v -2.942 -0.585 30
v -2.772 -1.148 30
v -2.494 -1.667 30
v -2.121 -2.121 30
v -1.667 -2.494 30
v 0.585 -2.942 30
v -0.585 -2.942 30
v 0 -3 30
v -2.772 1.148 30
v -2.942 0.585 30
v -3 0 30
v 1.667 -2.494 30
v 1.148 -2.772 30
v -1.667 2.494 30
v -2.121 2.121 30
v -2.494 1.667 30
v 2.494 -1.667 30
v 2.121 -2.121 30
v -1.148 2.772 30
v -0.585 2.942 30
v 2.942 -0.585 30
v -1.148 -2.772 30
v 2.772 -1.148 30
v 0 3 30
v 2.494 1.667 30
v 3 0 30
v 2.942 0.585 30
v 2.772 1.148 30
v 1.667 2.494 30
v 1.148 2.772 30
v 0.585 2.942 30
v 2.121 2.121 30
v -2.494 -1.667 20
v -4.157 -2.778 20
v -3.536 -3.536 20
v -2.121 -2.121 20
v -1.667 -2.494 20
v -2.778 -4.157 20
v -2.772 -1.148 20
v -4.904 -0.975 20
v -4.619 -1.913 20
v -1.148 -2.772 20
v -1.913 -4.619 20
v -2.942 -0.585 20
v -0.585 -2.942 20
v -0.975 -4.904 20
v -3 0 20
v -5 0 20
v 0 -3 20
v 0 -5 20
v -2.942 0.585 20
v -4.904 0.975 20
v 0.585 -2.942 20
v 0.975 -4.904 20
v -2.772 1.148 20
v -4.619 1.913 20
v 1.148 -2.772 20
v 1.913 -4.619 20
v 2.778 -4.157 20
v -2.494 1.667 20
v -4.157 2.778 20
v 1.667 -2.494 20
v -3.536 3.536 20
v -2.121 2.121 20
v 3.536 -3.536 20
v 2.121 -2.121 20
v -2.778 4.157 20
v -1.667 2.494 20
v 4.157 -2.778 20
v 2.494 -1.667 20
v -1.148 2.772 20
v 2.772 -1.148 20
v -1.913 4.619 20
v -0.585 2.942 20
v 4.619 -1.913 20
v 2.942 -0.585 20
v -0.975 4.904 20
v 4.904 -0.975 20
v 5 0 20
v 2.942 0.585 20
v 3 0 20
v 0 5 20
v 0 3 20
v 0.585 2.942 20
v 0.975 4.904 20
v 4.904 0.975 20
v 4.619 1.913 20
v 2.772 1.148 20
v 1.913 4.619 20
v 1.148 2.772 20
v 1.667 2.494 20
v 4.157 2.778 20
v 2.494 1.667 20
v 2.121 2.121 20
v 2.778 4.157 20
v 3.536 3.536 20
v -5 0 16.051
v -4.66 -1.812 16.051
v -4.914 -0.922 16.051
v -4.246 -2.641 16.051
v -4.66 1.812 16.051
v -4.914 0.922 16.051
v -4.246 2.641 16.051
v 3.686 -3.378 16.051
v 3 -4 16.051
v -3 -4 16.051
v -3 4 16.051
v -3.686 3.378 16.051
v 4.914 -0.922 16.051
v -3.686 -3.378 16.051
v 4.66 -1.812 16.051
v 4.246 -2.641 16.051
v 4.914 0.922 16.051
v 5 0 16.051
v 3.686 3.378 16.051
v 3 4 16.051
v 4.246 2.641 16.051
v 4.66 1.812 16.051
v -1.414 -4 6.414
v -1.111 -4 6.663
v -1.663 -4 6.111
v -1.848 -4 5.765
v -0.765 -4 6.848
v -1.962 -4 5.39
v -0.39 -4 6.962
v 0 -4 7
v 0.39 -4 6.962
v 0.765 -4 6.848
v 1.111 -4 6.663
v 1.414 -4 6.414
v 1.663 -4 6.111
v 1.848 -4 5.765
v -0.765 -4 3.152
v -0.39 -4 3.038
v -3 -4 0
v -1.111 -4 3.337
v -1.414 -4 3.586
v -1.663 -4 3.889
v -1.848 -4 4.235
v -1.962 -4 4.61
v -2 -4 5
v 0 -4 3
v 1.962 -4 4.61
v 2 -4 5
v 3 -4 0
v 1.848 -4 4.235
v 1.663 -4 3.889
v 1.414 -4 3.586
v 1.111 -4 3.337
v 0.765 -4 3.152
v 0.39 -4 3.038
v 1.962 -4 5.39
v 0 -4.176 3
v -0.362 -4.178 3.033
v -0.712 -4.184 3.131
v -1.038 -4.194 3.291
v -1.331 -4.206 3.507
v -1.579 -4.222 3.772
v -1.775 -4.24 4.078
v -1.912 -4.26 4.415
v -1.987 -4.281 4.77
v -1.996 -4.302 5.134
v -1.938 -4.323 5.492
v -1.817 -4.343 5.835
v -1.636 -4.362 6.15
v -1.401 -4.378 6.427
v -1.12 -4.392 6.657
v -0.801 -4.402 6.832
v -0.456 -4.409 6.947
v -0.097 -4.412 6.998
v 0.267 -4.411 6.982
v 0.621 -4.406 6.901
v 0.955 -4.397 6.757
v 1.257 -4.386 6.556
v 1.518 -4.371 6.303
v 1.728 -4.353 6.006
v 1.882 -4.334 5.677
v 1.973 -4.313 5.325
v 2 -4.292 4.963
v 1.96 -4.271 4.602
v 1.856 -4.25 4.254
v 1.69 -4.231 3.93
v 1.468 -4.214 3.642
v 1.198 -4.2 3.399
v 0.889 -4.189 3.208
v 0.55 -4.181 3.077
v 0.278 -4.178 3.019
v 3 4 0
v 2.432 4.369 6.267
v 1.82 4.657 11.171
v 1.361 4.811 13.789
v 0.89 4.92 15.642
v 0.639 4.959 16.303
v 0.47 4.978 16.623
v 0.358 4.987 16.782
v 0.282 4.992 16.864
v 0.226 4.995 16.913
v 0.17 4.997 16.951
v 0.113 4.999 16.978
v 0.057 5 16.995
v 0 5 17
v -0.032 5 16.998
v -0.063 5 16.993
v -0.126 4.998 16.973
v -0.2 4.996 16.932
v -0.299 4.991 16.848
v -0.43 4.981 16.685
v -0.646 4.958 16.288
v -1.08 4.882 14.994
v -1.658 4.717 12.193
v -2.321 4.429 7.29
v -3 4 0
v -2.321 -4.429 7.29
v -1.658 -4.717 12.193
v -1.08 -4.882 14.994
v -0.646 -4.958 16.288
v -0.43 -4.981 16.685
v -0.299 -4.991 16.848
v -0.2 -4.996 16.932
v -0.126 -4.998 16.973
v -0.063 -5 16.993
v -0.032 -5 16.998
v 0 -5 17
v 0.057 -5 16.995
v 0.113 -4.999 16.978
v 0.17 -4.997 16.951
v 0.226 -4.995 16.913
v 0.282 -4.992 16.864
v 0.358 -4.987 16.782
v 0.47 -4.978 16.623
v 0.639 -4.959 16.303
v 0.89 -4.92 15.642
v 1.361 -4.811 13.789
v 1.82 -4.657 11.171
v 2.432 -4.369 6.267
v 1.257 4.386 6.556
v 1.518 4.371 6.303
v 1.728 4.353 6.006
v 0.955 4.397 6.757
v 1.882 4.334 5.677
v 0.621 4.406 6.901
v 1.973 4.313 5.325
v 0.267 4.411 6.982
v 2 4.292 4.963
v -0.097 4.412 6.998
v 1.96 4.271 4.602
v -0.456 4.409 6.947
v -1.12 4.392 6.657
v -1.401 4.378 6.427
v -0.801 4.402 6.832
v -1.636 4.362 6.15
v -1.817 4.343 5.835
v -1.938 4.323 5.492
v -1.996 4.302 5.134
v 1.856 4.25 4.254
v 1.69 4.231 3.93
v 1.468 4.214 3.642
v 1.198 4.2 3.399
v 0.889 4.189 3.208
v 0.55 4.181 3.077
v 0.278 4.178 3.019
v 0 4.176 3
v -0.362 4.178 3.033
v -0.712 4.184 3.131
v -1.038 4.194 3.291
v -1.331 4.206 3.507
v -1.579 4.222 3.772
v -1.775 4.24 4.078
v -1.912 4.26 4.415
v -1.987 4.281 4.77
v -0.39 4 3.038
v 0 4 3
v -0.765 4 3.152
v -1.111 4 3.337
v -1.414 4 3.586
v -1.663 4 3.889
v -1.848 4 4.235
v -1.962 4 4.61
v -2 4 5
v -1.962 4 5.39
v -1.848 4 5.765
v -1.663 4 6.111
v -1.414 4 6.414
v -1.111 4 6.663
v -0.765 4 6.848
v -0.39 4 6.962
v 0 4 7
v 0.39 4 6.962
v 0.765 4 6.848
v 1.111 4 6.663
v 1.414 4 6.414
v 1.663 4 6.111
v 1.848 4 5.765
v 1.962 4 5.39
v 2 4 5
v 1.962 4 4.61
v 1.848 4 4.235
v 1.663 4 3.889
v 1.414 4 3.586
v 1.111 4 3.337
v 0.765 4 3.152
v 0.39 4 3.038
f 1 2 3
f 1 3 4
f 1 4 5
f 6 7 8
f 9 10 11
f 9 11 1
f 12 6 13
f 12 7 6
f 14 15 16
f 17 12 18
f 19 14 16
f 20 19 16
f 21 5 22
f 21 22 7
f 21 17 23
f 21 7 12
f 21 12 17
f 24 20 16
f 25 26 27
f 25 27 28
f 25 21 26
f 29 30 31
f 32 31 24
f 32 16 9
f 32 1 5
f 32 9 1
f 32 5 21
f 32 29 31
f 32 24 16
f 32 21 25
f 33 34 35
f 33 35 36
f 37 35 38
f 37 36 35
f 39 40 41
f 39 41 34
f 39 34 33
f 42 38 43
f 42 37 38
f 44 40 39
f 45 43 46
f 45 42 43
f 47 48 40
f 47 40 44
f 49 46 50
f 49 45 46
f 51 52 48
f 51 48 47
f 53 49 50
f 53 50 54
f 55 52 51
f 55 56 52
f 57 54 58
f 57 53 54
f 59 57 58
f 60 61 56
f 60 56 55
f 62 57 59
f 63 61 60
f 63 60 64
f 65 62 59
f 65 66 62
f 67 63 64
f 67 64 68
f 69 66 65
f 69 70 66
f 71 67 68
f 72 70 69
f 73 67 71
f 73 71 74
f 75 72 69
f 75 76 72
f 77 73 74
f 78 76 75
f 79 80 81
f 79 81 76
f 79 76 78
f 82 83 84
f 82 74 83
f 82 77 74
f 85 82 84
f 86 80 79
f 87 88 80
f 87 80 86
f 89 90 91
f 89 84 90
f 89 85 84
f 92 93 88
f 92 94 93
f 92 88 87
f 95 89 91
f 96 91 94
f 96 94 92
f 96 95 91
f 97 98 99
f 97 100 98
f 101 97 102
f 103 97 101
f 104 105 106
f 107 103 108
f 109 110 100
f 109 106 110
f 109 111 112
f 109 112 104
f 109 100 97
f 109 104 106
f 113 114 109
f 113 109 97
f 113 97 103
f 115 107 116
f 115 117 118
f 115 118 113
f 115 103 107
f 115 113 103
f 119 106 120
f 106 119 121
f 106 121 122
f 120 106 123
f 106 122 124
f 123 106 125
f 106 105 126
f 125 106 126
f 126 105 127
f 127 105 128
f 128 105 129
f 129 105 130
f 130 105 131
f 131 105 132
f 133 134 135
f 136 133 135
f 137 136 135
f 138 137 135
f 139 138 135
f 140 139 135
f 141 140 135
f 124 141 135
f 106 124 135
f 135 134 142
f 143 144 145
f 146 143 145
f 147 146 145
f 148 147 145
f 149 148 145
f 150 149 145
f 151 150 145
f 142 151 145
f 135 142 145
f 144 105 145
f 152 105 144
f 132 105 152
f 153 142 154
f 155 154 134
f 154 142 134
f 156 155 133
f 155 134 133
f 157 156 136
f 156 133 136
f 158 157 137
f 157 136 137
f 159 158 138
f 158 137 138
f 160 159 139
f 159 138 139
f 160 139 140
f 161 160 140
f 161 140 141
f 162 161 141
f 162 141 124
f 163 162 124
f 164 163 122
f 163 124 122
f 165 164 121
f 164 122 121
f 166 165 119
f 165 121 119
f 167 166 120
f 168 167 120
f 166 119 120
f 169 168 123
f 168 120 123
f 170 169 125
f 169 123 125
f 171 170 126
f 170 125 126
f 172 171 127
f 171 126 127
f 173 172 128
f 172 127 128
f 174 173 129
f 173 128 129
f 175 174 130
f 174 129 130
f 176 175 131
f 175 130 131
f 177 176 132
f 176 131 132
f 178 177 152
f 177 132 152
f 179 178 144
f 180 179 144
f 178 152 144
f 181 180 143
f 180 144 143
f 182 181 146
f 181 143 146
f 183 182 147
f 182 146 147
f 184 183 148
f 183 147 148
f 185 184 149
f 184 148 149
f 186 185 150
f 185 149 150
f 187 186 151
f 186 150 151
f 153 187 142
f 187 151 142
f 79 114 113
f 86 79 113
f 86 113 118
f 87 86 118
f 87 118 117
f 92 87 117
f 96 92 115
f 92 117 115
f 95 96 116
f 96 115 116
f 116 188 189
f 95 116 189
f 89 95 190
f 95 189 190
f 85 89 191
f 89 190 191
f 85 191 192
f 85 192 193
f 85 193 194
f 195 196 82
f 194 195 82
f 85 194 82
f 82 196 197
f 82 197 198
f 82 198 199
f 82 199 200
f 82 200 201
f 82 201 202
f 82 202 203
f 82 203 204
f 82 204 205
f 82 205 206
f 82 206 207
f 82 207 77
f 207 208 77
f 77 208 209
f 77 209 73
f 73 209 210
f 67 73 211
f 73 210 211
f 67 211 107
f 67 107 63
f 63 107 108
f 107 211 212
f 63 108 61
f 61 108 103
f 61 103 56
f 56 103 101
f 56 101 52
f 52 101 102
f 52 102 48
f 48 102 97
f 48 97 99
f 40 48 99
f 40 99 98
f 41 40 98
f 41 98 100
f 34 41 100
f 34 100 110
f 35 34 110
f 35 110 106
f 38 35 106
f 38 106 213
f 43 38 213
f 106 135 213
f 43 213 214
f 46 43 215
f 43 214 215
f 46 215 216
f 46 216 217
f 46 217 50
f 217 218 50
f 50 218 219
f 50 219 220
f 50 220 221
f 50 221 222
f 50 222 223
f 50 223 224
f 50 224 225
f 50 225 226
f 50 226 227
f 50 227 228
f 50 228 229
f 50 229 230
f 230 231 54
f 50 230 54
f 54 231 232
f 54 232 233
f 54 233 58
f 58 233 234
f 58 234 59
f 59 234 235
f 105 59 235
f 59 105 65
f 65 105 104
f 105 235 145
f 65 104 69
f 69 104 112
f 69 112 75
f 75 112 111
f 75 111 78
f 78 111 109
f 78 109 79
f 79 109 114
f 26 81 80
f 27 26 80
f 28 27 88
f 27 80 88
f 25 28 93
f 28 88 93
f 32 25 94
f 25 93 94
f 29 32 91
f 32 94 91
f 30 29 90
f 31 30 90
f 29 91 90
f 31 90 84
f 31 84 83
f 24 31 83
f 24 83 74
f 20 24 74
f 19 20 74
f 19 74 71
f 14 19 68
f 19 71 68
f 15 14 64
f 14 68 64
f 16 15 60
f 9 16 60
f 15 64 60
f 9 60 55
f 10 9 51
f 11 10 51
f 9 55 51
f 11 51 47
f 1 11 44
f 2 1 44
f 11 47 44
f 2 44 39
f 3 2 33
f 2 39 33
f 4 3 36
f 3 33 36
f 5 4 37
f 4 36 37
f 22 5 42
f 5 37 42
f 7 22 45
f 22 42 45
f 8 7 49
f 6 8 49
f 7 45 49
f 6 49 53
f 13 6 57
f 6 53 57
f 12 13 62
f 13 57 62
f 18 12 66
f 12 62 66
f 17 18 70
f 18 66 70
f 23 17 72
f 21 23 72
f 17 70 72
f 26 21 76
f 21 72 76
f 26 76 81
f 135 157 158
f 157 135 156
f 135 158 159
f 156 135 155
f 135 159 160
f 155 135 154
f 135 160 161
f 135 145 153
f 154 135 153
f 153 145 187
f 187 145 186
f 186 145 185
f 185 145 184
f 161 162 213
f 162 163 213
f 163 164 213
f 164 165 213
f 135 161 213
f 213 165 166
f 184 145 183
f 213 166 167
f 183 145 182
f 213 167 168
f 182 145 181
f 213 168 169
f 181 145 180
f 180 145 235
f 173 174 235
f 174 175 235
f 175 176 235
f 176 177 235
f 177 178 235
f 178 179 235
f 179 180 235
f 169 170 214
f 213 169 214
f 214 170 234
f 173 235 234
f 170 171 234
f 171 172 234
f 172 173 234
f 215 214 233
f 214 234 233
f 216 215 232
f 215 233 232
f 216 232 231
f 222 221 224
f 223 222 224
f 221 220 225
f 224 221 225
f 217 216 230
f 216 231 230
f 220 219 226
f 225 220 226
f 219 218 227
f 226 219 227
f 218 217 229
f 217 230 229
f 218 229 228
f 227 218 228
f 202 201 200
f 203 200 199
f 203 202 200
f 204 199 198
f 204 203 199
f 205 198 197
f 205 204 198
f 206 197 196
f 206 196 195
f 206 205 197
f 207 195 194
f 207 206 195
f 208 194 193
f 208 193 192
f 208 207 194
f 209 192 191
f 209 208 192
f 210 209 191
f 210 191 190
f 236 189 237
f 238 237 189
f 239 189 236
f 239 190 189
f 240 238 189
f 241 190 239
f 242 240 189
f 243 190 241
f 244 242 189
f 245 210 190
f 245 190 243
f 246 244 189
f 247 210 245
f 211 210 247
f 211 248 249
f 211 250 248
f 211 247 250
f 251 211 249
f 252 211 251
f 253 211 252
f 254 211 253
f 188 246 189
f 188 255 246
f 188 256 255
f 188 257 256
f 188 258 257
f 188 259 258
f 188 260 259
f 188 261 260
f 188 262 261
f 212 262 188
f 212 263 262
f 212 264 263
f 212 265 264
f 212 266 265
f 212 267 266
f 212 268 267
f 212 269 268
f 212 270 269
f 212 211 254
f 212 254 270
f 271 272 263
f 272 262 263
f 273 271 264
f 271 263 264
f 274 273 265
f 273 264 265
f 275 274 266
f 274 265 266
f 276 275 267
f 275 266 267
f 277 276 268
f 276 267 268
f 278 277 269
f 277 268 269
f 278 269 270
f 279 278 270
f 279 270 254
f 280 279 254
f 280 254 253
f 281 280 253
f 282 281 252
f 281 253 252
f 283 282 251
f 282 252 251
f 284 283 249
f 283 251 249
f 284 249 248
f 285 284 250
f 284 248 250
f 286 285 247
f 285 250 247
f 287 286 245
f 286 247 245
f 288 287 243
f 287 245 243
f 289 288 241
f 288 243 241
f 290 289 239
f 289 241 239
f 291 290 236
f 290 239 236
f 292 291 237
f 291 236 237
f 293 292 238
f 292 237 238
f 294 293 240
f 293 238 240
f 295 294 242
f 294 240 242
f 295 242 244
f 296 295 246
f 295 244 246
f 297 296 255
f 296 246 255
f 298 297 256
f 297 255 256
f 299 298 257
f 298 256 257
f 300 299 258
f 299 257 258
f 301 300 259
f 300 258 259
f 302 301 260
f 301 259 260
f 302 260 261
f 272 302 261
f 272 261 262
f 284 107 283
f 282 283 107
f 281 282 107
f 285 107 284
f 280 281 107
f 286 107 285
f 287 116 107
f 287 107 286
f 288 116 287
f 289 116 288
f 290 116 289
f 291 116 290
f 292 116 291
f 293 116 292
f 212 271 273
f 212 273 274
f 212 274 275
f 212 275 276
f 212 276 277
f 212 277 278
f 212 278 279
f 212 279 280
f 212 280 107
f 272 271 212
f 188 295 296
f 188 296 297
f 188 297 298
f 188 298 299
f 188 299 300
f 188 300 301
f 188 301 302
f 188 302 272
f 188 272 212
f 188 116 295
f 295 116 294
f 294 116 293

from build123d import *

# Parameters (mm, degrees)
SKETCH1_R           = 5
BOSS_EXTRUDE1_DEPTH = 20
SKETCH2_R           = 3
BOSS_EXTRUDE2_DEPTH = 10
CUT_EXTRUDE1_DEPTH  = 5
SKETCH4_W           = 16.051327138
SKETCH4_H           = 8
CUT_EXTRUDE2_DEPTH  = 5
SKETCH5_R           = 2
CUT_EXTRUDE3_DEPTH  = 5


with BuildPart() as part:
    # Sketch1 → Boss-Extrude1 (new body)
    with BuildSketch(Plane.XY):
        Circle(SKETCH1_R)
    extrude(amount=BOSS_EXTRUDE1_DEPTH)

    # Sketch2 → Boss-Extrude2 (add)
    with BuildSketch(Plane.XY.offset(20)):
        Circle(SKETCH2_R)
    extrude(amount=BOSS_EXTRUDE2_DEPTH)

    # Sketch3 → Cut-Extrude1 (cut, symmetric)
    with BuildSketch(Plane(origin=(0, 0, 0), x_dir=(0, 0, -1), z_dir=(1, 0, 0))):
        Polygon((0, 5), (-17, 5), (0, 4), align=None)
        Polygon((-17, -5), (0, -5), (0, -4), align=None)
    extrude(amount=CUT_EXTRUDE1_DEPTH, both=True, mode=Mode.SUBTRACT)

    # Sketch4 → Cut-Extrude2 (cut, symmetric)
    with BuildSketch(Plane(origin=(0, 0, 0), x_dir=(0, 0, -1), z_dir=(1, 0, 0))):
        with Locations((-8.025663569, 0)):
            Rectangle(SKETCH4_W, SKETCH4_H)
    extrude(amount=CUT_EXTRUDE2_DEPTH, both=True, mode=Mode.SUBTRACT)

    # Sketch5 → Cut-Extrude3 (cut, symmetric)
    with BuildSketch(Plane(origin=(0, 0, 0), x_dir=(1, 0, 0), z_dir=(0, 1, 0))):
        with Locations(Location((0, -5, 0), (0, 0, 90))):
            Circle(SKETCH5_R)
    extrude(amount=CUT_EXTRUDE3_DEPTH, both=True, mode=Mode.SUBTRACT)


solid = part.part
